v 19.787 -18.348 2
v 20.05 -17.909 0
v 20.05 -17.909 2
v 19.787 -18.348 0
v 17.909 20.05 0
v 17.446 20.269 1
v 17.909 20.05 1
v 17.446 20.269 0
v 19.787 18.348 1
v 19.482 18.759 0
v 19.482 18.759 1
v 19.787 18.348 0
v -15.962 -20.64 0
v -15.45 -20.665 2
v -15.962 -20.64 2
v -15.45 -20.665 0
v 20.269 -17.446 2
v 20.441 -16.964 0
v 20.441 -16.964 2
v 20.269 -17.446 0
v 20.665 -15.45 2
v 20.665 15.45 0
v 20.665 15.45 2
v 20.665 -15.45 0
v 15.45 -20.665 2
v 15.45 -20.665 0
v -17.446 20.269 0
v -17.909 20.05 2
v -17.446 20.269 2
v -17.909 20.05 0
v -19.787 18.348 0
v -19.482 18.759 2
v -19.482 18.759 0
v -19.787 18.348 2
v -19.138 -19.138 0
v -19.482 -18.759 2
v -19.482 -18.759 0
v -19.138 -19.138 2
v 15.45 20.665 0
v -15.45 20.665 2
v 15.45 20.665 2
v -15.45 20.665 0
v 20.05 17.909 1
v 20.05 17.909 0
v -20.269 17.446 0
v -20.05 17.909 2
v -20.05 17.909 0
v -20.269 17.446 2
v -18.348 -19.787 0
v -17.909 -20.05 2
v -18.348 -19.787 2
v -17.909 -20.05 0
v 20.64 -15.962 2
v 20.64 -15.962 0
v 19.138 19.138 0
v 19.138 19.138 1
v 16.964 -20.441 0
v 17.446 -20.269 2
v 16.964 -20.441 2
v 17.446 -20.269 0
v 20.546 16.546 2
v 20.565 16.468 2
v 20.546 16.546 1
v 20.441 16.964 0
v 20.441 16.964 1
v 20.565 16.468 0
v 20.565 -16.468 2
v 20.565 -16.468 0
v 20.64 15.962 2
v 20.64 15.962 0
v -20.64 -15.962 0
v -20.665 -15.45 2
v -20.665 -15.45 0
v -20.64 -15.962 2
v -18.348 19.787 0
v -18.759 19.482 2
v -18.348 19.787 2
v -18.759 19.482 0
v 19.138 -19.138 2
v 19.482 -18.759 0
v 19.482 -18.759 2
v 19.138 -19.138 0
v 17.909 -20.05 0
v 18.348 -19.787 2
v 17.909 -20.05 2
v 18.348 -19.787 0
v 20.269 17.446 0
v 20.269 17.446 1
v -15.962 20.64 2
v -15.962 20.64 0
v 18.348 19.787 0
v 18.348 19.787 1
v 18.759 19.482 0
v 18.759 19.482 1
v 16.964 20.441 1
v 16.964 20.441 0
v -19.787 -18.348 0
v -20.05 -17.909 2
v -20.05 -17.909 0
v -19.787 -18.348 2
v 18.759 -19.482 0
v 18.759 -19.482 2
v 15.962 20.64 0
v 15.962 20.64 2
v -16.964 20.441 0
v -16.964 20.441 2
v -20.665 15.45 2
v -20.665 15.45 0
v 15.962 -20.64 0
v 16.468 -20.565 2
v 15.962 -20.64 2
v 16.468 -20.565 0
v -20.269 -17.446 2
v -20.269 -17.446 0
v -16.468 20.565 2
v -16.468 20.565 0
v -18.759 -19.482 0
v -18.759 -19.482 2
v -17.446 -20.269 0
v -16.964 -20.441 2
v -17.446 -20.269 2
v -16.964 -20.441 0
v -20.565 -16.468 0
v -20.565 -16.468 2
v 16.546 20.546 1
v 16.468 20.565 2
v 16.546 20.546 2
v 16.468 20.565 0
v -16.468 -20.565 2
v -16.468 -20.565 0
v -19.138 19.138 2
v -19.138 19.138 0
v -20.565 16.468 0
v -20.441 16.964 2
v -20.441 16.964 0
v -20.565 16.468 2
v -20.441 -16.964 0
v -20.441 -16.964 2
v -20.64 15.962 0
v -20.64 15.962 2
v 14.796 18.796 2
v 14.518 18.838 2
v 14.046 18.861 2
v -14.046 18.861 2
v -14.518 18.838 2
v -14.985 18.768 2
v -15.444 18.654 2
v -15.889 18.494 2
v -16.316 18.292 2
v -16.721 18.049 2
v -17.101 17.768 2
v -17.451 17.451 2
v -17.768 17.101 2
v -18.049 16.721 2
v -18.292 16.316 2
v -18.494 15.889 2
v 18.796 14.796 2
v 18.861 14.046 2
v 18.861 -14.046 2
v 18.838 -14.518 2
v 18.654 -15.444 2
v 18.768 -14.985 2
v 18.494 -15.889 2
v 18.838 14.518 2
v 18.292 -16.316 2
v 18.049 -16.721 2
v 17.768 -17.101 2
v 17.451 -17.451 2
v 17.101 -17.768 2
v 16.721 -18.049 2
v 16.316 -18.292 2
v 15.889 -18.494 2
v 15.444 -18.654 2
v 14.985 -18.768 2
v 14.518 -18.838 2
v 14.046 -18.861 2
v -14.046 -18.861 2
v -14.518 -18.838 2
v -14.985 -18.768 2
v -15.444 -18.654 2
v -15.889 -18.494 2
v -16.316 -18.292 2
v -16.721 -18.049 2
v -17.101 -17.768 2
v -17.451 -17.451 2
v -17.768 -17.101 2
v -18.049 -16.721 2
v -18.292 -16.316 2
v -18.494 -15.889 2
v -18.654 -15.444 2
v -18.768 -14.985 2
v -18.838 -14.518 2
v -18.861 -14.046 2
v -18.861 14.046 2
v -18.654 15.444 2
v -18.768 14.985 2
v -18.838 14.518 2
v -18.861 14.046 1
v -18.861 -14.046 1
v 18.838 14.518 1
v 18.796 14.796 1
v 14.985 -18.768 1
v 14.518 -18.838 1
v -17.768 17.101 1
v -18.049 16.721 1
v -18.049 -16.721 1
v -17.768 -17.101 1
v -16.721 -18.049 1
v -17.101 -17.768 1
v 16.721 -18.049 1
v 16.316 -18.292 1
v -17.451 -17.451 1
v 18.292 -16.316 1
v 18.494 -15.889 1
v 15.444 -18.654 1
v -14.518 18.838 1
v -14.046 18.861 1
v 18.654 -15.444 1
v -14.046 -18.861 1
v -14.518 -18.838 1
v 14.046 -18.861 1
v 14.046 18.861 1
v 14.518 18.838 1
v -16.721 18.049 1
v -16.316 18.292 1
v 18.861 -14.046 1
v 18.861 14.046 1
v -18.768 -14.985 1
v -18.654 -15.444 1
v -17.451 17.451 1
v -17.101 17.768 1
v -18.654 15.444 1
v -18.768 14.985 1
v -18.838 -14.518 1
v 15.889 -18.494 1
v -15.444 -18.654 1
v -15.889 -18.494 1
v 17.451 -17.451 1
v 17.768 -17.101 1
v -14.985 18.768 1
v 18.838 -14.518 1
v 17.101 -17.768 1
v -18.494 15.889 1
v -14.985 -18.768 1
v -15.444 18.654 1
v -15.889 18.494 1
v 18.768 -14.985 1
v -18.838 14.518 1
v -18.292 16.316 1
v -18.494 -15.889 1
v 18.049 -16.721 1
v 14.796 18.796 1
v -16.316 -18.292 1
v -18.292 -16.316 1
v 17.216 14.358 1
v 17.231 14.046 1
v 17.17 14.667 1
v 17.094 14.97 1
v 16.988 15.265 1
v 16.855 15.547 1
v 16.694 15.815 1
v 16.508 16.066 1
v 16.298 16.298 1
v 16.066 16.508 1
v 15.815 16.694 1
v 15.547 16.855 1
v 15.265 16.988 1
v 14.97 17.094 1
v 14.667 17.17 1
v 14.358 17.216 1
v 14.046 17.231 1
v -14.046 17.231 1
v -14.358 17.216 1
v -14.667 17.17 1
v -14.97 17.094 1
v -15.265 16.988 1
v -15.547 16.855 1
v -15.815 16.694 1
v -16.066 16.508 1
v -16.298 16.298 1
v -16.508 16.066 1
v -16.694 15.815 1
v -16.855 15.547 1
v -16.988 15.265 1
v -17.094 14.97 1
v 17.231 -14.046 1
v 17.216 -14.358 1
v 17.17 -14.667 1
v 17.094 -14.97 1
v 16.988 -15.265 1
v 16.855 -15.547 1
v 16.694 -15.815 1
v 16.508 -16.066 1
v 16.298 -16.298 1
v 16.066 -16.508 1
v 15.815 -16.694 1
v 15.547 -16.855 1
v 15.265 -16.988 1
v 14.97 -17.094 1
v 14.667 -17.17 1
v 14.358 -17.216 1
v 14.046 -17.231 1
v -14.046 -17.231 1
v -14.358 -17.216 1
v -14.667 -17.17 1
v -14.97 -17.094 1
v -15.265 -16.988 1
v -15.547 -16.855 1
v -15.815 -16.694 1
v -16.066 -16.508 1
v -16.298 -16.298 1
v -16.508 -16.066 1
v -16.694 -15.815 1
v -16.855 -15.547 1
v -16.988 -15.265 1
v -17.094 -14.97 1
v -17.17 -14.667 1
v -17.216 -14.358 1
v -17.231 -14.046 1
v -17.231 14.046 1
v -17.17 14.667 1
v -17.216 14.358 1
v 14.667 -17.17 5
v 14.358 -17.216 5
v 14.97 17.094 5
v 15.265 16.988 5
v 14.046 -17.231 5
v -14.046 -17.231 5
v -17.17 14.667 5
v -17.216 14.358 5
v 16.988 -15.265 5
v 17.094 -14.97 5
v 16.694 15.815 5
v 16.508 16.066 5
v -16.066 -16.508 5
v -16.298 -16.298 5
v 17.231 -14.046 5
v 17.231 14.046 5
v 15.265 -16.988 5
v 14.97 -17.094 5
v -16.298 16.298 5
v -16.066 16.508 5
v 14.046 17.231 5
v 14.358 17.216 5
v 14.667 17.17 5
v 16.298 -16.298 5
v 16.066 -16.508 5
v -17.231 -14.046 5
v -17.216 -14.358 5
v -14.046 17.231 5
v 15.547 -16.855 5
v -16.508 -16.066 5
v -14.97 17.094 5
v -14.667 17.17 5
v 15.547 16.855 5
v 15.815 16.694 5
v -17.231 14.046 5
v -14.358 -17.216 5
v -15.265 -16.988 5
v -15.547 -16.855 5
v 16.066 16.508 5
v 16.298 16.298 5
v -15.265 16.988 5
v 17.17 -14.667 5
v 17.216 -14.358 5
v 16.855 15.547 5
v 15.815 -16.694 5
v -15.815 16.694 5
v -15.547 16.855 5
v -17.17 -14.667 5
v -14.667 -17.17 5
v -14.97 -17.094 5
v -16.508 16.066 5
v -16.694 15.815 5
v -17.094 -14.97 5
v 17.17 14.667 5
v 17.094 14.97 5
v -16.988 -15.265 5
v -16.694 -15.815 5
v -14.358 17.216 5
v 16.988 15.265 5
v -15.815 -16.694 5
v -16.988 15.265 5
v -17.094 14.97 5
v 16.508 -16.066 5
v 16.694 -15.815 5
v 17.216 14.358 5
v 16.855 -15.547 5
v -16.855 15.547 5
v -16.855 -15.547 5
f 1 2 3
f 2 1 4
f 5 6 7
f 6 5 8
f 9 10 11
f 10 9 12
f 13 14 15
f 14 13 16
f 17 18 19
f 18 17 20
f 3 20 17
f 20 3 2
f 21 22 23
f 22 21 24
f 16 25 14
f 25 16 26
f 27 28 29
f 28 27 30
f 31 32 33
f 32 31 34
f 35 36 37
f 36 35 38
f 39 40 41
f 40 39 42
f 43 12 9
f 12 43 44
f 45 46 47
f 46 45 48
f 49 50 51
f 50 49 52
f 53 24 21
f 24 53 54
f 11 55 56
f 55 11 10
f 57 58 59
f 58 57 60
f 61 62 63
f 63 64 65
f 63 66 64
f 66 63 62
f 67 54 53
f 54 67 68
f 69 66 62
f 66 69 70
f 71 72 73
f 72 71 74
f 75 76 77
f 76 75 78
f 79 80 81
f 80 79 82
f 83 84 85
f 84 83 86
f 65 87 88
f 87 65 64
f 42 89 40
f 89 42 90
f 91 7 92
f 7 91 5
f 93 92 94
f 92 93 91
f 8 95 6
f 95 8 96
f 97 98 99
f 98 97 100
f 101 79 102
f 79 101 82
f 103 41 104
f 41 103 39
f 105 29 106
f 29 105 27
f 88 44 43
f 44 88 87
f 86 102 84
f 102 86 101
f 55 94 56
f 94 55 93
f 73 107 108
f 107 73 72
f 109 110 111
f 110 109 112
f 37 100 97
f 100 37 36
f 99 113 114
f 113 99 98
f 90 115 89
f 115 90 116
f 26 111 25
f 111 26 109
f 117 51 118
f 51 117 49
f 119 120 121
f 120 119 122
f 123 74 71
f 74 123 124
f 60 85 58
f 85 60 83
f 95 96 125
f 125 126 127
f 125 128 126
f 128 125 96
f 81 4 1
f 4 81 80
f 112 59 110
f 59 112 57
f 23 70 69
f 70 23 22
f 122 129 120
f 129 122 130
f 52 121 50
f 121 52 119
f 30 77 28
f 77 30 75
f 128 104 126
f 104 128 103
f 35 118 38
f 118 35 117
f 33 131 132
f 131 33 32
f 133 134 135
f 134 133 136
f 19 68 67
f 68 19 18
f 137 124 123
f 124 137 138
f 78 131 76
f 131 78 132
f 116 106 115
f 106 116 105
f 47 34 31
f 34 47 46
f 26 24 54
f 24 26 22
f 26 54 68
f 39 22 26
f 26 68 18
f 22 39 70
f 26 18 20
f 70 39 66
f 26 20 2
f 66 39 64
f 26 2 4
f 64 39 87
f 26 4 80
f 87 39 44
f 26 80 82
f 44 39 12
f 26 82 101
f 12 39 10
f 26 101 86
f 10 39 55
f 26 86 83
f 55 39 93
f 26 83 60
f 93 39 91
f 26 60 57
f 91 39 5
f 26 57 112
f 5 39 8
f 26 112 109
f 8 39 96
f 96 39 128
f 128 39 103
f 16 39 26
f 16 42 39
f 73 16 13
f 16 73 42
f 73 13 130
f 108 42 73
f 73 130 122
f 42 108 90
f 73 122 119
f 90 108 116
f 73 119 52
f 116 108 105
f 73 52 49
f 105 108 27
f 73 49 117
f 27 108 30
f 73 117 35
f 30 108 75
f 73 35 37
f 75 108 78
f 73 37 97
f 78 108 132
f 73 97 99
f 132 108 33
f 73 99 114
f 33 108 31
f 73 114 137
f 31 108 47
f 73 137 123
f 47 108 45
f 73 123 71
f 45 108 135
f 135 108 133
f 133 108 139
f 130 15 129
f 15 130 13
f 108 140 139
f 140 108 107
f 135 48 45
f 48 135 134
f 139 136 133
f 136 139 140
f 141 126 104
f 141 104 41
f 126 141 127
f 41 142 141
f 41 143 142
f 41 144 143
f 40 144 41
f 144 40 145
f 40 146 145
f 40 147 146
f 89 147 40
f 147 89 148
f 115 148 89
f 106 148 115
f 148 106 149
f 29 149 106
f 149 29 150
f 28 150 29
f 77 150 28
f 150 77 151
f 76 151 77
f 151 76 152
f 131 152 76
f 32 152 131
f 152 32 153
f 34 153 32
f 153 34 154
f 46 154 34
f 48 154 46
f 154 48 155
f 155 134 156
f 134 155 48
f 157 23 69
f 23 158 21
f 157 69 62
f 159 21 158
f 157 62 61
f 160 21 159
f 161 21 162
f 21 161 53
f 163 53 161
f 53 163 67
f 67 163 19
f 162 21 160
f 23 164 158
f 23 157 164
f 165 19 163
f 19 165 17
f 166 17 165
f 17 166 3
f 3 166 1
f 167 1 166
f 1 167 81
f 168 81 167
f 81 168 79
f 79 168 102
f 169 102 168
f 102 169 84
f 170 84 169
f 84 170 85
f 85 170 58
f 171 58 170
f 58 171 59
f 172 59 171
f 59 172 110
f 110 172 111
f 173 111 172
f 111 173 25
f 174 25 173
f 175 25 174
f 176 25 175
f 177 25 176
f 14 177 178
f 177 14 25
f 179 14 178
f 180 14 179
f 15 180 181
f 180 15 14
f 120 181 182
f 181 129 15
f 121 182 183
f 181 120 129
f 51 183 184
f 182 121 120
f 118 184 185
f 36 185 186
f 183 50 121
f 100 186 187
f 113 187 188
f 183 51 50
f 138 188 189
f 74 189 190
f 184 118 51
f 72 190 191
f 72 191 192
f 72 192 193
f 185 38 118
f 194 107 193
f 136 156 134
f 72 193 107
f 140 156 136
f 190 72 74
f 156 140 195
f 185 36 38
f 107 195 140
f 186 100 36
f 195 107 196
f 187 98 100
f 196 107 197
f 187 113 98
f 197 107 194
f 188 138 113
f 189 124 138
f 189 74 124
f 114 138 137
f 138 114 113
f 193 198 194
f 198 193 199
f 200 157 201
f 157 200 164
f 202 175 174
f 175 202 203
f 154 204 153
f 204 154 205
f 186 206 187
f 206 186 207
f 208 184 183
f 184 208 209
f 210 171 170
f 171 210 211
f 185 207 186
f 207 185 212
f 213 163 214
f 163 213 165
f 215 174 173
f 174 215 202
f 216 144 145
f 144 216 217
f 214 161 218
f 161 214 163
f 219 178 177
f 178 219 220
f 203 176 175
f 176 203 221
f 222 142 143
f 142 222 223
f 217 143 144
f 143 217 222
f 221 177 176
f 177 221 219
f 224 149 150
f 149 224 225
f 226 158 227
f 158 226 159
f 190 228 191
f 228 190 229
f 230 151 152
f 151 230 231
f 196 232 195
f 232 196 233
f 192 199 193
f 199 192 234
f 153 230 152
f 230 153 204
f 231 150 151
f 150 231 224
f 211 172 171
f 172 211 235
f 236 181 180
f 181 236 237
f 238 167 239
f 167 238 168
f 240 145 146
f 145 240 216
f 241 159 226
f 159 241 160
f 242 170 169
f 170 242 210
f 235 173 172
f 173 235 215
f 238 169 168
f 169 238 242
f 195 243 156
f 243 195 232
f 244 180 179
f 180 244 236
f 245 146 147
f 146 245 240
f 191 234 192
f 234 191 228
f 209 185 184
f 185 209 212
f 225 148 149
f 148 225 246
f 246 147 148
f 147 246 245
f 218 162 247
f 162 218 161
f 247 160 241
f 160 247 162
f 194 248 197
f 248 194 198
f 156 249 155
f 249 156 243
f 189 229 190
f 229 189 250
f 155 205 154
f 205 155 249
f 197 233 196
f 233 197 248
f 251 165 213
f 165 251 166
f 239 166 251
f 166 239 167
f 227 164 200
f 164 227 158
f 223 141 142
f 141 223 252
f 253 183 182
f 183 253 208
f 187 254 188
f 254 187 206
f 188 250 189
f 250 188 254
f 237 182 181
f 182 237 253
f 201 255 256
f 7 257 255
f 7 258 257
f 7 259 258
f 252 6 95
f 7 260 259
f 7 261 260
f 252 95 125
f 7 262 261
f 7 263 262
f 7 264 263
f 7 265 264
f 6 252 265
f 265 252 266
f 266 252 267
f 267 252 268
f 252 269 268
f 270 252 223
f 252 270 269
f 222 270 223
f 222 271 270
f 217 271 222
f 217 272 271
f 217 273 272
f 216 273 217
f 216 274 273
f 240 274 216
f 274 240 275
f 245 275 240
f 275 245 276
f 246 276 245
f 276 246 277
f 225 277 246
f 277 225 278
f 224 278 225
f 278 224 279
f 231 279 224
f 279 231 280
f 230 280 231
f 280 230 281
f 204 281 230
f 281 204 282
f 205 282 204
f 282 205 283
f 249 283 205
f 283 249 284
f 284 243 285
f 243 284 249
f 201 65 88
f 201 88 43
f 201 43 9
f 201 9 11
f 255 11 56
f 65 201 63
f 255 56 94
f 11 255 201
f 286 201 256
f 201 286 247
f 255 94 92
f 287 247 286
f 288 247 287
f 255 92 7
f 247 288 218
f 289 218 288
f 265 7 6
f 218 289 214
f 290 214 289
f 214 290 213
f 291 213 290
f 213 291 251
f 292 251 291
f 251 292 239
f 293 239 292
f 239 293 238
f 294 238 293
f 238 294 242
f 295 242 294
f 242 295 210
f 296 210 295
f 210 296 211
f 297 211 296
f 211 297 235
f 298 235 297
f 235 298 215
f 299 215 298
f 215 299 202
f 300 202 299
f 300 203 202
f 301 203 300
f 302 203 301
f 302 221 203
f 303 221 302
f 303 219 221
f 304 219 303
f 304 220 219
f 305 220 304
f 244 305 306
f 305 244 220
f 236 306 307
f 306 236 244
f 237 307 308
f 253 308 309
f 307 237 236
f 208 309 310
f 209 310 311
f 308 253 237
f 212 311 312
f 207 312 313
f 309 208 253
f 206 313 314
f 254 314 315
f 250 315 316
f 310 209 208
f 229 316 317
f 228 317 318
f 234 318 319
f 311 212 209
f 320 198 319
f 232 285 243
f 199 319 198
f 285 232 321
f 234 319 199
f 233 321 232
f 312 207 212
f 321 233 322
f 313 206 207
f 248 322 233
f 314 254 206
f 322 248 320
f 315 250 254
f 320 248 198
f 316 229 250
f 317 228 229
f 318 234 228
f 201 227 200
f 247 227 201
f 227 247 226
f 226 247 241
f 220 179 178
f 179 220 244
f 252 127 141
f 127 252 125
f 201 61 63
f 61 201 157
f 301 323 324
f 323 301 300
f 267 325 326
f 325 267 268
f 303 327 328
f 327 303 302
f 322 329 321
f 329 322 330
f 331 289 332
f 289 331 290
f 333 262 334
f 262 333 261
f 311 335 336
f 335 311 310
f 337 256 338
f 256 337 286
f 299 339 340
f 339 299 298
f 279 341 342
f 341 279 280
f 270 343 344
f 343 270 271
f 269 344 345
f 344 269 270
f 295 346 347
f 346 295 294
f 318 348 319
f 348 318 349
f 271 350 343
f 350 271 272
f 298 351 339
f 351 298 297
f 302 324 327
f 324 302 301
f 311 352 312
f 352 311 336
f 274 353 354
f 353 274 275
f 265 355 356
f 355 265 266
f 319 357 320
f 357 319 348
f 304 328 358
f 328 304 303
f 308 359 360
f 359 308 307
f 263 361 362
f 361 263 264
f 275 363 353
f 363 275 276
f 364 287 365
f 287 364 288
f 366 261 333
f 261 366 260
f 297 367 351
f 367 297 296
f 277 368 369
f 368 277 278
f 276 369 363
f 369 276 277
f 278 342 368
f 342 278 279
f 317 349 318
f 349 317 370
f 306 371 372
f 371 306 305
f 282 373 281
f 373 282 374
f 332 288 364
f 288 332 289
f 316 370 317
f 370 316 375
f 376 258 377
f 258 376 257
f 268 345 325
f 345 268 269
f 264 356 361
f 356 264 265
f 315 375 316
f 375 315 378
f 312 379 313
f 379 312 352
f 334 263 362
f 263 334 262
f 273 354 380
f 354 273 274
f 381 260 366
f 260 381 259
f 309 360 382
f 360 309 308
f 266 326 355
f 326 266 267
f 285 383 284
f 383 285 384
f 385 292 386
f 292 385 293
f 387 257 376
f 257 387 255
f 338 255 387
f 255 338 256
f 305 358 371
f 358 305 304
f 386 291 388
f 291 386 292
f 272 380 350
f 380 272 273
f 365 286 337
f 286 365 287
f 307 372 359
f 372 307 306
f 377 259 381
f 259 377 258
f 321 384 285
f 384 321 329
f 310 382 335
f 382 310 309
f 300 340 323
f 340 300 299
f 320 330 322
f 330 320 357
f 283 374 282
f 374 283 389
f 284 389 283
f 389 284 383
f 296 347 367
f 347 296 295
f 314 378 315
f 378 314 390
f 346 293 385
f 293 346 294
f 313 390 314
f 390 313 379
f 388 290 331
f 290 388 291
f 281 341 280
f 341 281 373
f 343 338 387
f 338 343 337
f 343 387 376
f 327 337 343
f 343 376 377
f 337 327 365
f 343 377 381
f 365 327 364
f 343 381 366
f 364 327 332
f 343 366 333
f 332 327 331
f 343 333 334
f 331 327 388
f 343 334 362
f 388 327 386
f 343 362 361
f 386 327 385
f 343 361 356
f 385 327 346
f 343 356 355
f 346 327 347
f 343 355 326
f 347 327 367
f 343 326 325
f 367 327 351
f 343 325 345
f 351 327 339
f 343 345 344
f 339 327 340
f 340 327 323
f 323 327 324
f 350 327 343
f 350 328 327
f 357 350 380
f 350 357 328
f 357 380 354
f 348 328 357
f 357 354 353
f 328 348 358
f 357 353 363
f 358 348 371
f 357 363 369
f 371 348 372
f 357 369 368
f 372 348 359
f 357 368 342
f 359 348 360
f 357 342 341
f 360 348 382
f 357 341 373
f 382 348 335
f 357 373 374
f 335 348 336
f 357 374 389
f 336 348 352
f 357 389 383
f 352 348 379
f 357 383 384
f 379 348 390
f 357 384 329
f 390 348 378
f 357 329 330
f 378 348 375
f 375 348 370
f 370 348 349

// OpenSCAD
wireLen  = 137.5;
wireDiam = 1.63;
bendRadius = 4.0;

pi = 3.141592653589793238;
wireRadius = bendRadius - wireDiam/2.0;

circumference = 2.0*pi*bendRadius;

diff = (wireLen - circumference);
sd   = diff/4.0;


module coreI(Hgt=5){
  hull(){
    translate([-sd/2.0,-sd/2.0,0]) cylinder(h=Hgt,r=wireRadius,center=false,$fn=64);
    translate([ sd/2.0,-sd/2.0,0]) cylinder(h=Hgt,r=wireRadius,center=false,$fn=64);
    translate([-sd/2.0, sd/2.0,0]) cylinder(h=Hgt,r=wireRadius,center=false,$fn=64);
    translate([ sd/2.0, sd/2.0,0]) cylinder(h=Hgt,r=wireRadius,center=false,$fn=64);
  }
}

module coreO(Hgt=4){
  translate([0,0,1]) hull(){
    translate([-sd/2.0,-sd/2.0,0]) cylinder(h=Hgt,r=bendRadius+wireDiam/2.0,center=false,$fn=64);
    translate([ sd/2.0,-sd/2.0,0]) cylinder(h=Hgt,r=bendRadius+wireDiam/2.0,center=false,$fn=64);
    translate([-sd/2.0, sd/2.0,0]) cylinder(h=Hgt,r=bendRadius+wireDiam/2.0,center=false,$fn=64);
    translate([ sd/2.0, sd/2.0,0]) cylinder(h=Hgt,r=bendRadius+wireDiam/2.0,center=false,$fn=64);
  }
}

module coreB(Hgt=2){
  hull(){
    translate([-sd/2.0*1.1,-sd/2.0*1.1,0]) cylinder(h=Hgt,r=1.1*bendRadius+wireDiam/2.0,center=false,$fn=64);
    translate([ sd/2.0*1.1,-sd/2.0*1.1,0]) cylinder(h=Hgt,r=1.1*bendRadius+wireDiam/2.0,center=false,$fn=64);
    translate([-sd/2.0*1.1, sd/2.0*1.1,0]) cylinder(h=Hgt,r=1.1*bendRadius+wireDiam/2.0,center=false,$fn=64);
    translate([ sd/2.0*1.1, sd/2.0*1.1,0]) cylinder(h=Hgt,r=1.1*bendRadius+wireDiam/2.0,center=false,$fn=64);
  }
}

union(){
  difference(){
   coreB();
   coreO();
   translate([sd/2.0+bendRadius,sd/2.0+bendRadius,1]) cylinder(h=5,r=bendRadius,center=false,$fn=4);
  }
  coreI();
}
